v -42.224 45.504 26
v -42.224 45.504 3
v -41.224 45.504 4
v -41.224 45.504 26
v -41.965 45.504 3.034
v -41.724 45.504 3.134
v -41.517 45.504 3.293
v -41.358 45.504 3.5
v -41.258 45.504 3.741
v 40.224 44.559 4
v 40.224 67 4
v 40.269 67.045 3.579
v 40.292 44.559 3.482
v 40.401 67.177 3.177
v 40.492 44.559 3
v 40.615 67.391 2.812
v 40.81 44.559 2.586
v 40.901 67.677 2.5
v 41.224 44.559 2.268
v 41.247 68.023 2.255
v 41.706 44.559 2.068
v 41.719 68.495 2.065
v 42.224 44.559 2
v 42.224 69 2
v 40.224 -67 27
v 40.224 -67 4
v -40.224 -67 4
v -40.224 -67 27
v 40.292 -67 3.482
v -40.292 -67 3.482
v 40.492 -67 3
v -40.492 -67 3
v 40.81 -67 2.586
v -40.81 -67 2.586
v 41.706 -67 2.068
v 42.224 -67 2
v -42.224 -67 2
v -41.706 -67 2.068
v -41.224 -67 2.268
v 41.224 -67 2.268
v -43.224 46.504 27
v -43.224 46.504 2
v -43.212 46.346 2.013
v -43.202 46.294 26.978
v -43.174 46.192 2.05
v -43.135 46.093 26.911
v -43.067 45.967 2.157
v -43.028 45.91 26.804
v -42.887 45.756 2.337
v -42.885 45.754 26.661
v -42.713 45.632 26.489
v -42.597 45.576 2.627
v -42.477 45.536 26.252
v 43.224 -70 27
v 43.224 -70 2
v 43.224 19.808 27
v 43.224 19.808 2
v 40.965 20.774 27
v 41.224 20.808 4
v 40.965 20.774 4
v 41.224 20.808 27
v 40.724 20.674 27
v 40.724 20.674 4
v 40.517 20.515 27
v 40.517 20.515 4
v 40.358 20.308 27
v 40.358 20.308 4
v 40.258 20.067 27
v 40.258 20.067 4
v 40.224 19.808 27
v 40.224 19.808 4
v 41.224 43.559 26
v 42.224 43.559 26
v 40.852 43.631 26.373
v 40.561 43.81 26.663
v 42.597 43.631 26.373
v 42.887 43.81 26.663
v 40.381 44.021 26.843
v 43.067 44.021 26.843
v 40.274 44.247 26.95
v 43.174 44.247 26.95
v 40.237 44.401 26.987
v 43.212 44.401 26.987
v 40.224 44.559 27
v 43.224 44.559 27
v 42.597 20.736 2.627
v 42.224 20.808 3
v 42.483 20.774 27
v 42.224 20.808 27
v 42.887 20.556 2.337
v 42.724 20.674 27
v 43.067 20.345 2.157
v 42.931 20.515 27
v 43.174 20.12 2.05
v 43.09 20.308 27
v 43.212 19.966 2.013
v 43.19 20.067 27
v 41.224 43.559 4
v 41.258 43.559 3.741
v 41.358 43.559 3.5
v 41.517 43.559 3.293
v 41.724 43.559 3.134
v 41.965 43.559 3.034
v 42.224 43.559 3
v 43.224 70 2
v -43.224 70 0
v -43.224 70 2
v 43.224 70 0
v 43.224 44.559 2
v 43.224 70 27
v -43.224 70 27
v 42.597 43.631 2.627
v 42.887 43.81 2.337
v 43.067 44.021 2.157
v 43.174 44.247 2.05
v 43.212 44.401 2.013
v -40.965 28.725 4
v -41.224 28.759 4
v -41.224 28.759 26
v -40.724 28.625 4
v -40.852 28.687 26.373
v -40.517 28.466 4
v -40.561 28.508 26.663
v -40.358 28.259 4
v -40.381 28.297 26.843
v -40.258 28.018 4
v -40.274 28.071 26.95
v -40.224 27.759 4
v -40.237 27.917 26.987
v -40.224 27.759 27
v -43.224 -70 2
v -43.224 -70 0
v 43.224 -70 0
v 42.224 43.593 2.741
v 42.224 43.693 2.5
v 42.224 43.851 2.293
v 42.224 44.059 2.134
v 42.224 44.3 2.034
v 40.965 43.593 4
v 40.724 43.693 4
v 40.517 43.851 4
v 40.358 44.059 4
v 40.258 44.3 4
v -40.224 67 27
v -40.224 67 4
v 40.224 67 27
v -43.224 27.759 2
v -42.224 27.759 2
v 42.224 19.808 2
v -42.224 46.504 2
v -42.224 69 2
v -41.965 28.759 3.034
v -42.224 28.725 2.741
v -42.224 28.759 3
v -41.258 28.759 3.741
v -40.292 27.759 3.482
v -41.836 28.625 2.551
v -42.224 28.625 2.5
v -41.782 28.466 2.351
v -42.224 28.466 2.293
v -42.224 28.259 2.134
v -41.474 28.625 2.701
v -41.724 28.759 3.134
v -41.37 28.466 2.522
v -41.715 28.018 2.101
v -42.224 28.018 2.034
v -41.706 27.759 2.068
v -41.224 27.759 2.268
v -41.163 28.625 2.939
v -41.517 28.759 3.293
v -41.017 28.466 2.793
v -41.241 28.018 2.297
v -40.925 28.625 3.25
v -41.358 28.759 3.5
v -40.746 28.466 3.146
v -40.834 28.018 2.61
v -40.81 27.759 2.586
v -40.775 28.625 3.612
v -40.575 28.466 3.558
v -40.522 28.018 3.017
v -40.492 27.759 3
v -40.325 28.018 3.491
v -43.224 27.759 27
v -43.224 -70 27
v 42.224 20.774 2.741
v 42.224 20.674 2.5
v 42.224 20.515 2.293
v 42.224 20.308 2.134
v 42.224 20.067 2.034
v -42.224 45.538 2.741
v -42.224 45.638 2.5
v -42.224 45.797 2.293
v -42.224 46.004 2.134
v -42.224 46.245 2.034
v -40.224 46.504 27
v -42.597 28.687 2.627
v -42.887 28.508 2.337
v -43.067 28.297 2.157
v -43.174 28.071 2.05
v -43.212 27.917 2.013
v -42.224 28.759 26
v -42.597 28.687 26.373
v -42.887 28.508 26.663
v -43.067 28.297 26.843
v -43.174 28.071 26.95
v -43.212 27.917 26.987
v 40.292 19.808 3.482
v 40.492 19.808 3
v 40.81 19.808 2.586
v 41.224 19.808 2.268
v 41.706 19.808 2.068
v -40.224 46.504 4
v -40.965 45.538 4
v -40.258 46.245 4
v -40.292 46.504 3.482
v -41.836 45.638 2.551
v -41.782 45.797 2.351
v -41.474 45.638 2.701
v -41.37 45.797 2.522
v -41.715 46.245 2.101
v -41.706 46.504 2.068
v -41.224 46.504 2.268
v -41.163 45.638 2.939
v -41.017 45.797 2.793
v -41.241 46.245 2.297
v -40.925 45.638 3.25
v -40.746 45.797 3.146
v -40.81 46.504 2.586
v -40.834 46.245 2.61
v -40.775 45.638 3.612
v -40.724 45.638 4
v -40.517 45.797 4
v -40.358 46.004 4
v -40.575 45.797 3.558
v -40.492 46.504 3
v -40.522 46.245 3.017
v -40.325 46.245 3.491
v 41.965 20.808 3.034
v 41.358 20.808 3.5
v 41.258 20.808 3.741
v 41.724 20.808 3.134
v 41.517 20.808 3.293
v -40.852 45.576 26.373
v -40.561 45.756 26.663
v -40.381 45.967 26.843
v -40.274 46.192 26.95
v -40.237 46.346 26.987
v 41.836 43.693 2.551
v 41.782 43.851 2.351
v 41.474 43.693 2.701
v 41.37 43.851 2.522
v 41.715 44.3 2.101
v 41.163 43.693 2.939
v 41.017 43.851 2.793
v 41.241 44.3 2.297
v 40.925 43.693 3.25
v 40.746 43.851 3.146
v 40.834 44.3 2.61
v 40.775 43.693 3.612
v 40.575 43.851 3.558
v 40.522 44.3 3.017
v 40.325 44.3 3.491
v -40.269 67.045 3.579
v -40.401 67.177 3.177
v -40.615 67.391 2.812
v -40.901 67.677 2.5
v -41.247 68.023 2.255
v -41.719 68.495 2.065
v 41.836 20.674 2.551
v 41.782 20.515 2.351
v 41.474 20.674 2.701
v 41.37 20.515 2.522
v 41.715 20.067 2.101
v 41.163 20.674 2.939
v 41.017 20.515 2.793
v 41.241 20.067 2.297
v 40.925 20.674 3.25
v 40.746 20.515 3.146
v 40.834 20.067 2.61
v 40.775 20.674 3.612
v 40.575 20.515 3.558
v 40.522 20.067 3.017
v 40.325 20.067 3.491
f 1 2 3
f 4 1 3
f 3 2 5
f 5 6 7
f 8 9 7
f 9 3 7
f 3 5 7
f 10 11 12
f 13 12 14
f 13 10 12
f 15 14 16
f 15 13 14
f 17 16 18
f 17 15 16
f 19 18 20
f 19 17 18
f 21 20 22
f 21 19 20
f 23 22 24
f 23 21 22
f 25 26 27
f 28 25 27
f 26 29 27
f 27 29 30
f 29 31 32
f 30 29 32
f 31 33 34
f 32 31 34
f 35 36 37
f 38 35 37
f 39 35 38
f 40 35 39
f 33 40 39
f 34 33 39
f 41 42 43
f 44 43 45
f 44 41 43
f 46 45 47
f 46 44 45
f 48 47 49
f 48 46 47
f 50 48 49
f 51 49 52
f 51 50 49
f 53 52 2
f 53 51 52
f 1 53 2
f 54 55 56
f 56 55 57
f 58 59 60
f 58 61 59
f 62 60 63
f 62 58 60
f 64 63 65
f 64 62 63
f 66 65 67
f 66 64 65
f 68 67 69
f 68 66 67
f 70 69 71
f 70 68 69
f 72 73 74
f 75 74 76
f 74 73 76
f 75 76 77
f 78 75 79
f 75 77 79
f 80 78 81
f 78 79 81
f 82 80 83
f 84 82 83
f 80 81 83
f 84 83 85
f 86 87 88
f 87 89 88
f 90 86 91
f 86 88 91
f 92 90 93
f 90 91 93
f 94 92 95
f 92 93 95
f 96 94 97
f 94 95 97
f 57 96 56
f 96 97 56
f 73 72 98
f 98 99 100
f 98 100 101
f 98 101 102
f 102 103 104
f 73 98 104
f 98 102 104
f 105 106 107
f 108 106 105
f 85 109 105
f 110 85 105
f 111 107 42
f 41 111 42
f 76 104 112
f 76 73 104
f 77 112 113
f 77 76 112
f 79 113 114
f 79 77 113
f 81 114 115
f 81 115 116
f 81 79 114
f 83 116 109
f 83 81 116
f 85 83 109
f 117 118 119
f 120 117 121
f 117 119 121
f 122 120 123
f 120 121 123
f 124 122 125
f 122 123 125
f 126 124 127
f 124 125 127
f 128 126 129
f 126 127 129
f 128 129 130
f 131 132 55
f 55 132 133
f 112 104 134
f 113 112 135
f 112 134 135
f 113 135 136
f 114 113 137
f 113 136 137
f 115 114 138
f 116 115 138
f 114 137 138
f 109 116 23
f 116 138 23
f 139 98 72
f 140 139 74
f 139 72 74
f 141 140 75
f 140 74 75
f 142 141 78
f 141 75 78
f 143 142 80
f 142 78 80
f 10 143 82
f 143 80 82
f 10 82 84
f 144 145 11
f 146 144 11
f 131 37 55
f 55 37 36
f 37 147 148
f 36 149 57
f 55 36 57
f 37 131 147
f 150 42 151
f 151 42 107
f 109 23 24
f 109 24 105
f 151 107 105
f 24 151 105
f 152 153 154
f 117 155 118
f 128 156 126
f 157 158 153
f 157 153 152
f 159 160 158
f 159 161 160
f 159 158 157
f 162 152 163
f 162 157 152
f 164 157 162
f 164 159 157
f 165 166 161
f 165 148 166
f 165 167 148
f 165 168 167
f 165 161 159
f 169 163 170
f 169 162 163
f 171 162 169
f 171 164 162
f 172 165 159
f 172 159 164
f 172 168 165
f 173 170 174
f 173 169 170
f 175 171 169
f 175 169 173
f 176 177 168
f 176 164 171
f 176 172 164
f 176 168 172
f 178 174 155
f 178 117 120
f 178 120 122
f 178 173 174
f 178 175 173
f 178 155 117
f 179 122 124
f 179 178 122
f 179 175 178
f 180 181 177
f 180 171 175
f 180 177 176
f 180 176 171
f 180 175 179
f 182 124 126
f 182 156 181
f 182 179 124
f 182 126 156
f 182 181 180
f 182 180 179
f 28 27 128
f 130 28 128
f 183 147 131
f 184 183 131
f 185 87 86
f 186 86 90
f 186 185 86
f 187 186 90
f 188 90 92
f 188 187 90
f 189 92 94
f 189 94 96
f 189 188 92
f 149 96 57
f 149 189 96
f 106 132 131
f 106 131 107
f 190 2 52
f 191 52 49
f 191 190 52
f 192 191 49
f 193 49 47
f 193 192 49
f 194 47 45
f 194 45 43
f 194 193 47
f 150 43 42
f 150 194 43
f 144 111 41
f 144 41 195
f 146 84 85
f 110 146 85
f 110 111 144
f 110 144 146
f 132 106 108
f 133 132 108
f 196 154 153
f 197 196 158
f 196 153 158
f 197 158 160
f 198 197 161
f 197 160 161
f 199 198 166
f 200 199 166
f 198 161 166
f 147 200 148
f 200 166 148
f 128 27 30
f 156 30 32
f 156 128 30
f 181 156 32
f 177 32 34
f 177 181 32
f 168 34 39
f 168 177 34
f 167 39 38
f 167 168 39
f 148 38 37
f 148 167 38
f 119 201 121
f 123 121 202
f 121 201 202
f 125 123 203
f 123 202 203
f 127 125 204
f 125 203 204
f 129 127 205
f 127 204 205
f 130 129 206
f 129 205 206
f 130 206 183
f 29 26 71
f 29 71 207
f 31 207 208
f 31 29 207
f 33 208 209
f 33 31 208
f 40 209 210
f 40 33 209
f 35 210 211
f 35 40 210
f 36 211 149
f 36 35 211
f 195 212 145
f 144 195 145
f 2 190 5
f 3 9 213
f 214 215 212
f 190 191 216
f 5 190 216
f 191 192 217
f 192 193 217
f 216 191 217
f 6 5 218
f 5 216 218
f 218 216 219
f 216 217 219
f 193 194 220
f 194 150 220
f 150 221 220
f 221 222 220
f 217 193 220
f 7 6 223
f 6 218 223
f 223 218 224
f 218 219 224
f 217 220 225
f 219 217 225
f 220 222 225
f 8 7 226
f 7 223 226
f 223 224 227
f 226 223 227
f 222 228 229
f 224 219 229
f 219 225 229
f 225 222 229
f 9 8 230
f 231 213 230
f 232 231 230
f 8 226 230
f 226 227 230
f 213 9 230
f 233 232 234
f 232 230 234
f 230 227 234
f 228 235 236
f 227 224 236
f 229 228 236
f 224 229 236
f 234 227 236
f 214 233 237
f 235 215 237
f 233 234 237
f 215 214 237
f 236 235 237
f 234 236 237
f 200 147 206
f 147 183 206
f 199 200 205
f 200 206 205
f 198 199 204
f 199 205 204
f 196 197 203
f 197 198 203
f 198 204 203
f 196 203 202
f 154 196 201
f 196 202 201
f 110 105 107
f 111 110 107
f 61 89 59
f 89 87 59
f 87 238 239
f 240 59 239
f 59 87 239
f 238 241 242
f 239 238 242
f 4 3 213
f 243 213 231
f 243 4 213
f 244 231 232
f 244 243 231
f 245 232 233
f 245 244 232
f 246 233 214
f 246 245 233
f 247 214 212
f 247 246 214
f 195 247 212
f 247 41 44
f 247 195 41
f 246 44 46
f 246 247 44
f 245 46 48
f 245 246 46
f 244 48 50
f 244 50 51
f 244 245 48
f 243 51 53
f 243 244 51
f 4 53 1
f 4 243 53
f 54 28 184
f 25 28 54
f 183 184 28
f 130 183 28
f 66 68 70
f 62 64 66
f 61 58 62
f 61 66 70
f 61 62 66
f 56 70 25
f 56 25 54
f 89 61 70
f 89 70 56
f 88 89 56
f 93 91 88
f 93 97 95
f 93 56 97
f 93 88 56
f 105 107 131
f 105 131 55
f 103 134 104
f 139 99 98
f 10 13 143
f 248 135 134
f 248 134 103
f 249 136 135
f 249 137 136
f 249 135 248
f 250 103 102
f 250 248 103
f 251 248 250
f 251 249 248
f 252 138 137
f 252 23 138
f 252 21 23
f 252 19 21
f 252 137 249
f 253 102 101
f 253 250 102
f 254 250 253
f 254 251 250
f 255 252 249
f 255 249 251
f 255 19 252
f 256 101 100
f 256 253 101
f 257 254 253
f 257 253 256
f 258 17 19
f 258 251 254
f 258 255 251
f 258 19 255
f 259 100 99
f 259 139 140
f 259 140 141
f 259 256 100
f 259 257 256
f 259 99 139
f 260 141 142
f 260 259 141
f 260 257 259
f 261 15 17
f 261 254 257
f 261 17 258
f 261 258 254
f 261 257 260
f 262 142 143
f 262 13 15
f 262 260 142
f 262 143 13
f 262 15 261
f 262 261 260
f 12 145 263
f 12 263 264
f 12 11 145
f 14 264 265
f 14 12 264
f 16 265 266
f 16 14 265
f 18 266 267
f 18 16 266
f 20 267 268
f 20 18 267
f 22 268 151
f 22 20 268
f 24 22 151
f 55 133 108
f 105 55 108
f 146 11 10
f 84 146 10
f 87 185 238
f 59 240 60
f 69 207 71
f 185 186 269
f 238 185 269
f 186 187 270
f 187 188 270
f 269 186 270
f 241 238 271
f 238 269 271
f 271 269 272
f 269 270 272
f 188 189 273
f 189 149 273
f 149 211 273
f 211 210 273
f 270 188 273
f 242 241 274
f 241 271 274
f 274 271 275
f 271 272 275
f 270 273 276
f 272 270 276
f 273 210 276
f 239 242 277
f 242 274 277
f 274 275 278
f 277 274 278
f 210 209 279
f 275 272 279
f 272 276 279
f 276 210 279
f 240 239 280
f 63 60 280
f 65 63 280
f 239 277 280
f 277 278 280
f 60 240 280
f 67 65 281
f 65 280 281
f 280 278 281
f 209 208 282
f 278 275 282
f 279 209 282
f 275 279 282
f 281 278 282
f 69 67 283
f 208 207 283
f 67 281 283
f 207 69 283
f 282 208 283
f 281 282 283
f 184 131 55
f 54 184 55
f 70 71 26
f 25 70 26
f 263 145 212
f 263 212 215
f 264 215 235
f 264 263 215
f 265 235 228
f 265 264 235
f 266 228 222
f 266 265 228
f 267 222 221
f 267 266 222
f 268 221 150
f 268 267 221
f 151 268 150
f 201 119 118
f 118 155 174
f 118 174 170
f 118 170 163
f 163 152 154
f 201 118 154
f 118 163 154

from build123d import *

# Parameters (mm, degrees)
F0_W     = 86.4480845821
F0_H     = 140
F1_DEPTH = 2
F3_DEPTH = 25
F4_R     = 2
F4_2_R   = 2
F5_R     = 1
F5_2_R   = 1


with BuildPart() as f1:
    # F0 (on Top) → F1 (new body)
    with BuildSketch(Plane.XY):
        Rectangle(F0_W, F0_H)
    extrude(amount=F1_DEPTH)


with BuildPart() as f3:
    # F2 (on face) → F3 (new body)
    with BuildSketch(Plane.XY.offset(2)):
        Polygon((-43.224042291, -70), (43.224042291, -70), (43.224042291, 20.8081062883), (40.224042291, 20.8081062883), (40.224042291, -67), (-40.224042291, -67), (-40.224042291, 28.7592317909), (-43.224042291, 28.7592317909), align=None)
    extrude(amount=F3_DEPTH)

    # F4#2
    f4_2_edges = [f3.edges().sort_by_distance(p)[0] for p in [
        (40.224042, -23.095947, 2),
        (-40.224042, -19.120384, 2),
    ]]
    fillet(f4_2_edges, radius=F4_2_R)

    # F5
    f5_edges = [f3.edges().sort_by_distance(p)[0] for p in [
        (-40.224042, 28.759232, 15.5),
        (40.224042, 20.808106, 15.5),
        (43.224042, 20.808106, 14.5),
        (-40.809829, 28.759232, 2.585786),
        (-41.724042, 28.759232, 27),
        (-42.724042, 28.759232, 2),
        (-43.224042, 28.759232, 14.5),
        (-40.224042, -19.120384, 4),
        (40.224042, -23.095947, 4),
    ]]
    fillet(f5_edges, radius=F5_R)


with BuildPart() as f3b:
    # F2 (on face) → F3, piece 2 (new body)
    with BuildSketch(Plane.XY.offset(2)):
        Polygon((40.224042291, 43.5585826635), (43.224042291, 43.5585826635), (43.224042291, 70), (-43.224042291, 70), (-43.224042291, 45.5040372908), (-40.224042291, 45.5040372908), (-40.224042291, 67), (40.224042291, 67), align=None)
    extrude(amount=F3_DEPTH)

    # F4
    f4_edges = [f3b.edges().sort_by_distance(p)[0] for p in [
        (0, 67, 2),
        (-40.224042, 56.252019, 2),
        (40.224042, 55.279291, 2),
    ]]
    fillet(f4_edges, radius=F4_R)

    # F5#2
    f5_2_edges = [f3b.edges().sort_by_distance(p)[0] for p in [
        (40.224042, 43.558583, 15.5),
        (40.809829, 43.558583, 2.585786),
        (41.724042, 43.558583, 27),
        (42.724042, 43.558583, 2),
        (43.224042, 43.558583, 14.5),
        (-40.224042, 45.504037, 15.5),
        (-40.809829, 45.504037, 2.585786),
        (-41.724042, 45.504037, 27),
        (-42.724042, 45.504037, 2),
        (-43.224042, 45.504037, 14.5),
    ]]
    fillet(f5_2_edges, radius=F5_2_R)


solid = Compound([f1.part, f3.part, f3b.part])
